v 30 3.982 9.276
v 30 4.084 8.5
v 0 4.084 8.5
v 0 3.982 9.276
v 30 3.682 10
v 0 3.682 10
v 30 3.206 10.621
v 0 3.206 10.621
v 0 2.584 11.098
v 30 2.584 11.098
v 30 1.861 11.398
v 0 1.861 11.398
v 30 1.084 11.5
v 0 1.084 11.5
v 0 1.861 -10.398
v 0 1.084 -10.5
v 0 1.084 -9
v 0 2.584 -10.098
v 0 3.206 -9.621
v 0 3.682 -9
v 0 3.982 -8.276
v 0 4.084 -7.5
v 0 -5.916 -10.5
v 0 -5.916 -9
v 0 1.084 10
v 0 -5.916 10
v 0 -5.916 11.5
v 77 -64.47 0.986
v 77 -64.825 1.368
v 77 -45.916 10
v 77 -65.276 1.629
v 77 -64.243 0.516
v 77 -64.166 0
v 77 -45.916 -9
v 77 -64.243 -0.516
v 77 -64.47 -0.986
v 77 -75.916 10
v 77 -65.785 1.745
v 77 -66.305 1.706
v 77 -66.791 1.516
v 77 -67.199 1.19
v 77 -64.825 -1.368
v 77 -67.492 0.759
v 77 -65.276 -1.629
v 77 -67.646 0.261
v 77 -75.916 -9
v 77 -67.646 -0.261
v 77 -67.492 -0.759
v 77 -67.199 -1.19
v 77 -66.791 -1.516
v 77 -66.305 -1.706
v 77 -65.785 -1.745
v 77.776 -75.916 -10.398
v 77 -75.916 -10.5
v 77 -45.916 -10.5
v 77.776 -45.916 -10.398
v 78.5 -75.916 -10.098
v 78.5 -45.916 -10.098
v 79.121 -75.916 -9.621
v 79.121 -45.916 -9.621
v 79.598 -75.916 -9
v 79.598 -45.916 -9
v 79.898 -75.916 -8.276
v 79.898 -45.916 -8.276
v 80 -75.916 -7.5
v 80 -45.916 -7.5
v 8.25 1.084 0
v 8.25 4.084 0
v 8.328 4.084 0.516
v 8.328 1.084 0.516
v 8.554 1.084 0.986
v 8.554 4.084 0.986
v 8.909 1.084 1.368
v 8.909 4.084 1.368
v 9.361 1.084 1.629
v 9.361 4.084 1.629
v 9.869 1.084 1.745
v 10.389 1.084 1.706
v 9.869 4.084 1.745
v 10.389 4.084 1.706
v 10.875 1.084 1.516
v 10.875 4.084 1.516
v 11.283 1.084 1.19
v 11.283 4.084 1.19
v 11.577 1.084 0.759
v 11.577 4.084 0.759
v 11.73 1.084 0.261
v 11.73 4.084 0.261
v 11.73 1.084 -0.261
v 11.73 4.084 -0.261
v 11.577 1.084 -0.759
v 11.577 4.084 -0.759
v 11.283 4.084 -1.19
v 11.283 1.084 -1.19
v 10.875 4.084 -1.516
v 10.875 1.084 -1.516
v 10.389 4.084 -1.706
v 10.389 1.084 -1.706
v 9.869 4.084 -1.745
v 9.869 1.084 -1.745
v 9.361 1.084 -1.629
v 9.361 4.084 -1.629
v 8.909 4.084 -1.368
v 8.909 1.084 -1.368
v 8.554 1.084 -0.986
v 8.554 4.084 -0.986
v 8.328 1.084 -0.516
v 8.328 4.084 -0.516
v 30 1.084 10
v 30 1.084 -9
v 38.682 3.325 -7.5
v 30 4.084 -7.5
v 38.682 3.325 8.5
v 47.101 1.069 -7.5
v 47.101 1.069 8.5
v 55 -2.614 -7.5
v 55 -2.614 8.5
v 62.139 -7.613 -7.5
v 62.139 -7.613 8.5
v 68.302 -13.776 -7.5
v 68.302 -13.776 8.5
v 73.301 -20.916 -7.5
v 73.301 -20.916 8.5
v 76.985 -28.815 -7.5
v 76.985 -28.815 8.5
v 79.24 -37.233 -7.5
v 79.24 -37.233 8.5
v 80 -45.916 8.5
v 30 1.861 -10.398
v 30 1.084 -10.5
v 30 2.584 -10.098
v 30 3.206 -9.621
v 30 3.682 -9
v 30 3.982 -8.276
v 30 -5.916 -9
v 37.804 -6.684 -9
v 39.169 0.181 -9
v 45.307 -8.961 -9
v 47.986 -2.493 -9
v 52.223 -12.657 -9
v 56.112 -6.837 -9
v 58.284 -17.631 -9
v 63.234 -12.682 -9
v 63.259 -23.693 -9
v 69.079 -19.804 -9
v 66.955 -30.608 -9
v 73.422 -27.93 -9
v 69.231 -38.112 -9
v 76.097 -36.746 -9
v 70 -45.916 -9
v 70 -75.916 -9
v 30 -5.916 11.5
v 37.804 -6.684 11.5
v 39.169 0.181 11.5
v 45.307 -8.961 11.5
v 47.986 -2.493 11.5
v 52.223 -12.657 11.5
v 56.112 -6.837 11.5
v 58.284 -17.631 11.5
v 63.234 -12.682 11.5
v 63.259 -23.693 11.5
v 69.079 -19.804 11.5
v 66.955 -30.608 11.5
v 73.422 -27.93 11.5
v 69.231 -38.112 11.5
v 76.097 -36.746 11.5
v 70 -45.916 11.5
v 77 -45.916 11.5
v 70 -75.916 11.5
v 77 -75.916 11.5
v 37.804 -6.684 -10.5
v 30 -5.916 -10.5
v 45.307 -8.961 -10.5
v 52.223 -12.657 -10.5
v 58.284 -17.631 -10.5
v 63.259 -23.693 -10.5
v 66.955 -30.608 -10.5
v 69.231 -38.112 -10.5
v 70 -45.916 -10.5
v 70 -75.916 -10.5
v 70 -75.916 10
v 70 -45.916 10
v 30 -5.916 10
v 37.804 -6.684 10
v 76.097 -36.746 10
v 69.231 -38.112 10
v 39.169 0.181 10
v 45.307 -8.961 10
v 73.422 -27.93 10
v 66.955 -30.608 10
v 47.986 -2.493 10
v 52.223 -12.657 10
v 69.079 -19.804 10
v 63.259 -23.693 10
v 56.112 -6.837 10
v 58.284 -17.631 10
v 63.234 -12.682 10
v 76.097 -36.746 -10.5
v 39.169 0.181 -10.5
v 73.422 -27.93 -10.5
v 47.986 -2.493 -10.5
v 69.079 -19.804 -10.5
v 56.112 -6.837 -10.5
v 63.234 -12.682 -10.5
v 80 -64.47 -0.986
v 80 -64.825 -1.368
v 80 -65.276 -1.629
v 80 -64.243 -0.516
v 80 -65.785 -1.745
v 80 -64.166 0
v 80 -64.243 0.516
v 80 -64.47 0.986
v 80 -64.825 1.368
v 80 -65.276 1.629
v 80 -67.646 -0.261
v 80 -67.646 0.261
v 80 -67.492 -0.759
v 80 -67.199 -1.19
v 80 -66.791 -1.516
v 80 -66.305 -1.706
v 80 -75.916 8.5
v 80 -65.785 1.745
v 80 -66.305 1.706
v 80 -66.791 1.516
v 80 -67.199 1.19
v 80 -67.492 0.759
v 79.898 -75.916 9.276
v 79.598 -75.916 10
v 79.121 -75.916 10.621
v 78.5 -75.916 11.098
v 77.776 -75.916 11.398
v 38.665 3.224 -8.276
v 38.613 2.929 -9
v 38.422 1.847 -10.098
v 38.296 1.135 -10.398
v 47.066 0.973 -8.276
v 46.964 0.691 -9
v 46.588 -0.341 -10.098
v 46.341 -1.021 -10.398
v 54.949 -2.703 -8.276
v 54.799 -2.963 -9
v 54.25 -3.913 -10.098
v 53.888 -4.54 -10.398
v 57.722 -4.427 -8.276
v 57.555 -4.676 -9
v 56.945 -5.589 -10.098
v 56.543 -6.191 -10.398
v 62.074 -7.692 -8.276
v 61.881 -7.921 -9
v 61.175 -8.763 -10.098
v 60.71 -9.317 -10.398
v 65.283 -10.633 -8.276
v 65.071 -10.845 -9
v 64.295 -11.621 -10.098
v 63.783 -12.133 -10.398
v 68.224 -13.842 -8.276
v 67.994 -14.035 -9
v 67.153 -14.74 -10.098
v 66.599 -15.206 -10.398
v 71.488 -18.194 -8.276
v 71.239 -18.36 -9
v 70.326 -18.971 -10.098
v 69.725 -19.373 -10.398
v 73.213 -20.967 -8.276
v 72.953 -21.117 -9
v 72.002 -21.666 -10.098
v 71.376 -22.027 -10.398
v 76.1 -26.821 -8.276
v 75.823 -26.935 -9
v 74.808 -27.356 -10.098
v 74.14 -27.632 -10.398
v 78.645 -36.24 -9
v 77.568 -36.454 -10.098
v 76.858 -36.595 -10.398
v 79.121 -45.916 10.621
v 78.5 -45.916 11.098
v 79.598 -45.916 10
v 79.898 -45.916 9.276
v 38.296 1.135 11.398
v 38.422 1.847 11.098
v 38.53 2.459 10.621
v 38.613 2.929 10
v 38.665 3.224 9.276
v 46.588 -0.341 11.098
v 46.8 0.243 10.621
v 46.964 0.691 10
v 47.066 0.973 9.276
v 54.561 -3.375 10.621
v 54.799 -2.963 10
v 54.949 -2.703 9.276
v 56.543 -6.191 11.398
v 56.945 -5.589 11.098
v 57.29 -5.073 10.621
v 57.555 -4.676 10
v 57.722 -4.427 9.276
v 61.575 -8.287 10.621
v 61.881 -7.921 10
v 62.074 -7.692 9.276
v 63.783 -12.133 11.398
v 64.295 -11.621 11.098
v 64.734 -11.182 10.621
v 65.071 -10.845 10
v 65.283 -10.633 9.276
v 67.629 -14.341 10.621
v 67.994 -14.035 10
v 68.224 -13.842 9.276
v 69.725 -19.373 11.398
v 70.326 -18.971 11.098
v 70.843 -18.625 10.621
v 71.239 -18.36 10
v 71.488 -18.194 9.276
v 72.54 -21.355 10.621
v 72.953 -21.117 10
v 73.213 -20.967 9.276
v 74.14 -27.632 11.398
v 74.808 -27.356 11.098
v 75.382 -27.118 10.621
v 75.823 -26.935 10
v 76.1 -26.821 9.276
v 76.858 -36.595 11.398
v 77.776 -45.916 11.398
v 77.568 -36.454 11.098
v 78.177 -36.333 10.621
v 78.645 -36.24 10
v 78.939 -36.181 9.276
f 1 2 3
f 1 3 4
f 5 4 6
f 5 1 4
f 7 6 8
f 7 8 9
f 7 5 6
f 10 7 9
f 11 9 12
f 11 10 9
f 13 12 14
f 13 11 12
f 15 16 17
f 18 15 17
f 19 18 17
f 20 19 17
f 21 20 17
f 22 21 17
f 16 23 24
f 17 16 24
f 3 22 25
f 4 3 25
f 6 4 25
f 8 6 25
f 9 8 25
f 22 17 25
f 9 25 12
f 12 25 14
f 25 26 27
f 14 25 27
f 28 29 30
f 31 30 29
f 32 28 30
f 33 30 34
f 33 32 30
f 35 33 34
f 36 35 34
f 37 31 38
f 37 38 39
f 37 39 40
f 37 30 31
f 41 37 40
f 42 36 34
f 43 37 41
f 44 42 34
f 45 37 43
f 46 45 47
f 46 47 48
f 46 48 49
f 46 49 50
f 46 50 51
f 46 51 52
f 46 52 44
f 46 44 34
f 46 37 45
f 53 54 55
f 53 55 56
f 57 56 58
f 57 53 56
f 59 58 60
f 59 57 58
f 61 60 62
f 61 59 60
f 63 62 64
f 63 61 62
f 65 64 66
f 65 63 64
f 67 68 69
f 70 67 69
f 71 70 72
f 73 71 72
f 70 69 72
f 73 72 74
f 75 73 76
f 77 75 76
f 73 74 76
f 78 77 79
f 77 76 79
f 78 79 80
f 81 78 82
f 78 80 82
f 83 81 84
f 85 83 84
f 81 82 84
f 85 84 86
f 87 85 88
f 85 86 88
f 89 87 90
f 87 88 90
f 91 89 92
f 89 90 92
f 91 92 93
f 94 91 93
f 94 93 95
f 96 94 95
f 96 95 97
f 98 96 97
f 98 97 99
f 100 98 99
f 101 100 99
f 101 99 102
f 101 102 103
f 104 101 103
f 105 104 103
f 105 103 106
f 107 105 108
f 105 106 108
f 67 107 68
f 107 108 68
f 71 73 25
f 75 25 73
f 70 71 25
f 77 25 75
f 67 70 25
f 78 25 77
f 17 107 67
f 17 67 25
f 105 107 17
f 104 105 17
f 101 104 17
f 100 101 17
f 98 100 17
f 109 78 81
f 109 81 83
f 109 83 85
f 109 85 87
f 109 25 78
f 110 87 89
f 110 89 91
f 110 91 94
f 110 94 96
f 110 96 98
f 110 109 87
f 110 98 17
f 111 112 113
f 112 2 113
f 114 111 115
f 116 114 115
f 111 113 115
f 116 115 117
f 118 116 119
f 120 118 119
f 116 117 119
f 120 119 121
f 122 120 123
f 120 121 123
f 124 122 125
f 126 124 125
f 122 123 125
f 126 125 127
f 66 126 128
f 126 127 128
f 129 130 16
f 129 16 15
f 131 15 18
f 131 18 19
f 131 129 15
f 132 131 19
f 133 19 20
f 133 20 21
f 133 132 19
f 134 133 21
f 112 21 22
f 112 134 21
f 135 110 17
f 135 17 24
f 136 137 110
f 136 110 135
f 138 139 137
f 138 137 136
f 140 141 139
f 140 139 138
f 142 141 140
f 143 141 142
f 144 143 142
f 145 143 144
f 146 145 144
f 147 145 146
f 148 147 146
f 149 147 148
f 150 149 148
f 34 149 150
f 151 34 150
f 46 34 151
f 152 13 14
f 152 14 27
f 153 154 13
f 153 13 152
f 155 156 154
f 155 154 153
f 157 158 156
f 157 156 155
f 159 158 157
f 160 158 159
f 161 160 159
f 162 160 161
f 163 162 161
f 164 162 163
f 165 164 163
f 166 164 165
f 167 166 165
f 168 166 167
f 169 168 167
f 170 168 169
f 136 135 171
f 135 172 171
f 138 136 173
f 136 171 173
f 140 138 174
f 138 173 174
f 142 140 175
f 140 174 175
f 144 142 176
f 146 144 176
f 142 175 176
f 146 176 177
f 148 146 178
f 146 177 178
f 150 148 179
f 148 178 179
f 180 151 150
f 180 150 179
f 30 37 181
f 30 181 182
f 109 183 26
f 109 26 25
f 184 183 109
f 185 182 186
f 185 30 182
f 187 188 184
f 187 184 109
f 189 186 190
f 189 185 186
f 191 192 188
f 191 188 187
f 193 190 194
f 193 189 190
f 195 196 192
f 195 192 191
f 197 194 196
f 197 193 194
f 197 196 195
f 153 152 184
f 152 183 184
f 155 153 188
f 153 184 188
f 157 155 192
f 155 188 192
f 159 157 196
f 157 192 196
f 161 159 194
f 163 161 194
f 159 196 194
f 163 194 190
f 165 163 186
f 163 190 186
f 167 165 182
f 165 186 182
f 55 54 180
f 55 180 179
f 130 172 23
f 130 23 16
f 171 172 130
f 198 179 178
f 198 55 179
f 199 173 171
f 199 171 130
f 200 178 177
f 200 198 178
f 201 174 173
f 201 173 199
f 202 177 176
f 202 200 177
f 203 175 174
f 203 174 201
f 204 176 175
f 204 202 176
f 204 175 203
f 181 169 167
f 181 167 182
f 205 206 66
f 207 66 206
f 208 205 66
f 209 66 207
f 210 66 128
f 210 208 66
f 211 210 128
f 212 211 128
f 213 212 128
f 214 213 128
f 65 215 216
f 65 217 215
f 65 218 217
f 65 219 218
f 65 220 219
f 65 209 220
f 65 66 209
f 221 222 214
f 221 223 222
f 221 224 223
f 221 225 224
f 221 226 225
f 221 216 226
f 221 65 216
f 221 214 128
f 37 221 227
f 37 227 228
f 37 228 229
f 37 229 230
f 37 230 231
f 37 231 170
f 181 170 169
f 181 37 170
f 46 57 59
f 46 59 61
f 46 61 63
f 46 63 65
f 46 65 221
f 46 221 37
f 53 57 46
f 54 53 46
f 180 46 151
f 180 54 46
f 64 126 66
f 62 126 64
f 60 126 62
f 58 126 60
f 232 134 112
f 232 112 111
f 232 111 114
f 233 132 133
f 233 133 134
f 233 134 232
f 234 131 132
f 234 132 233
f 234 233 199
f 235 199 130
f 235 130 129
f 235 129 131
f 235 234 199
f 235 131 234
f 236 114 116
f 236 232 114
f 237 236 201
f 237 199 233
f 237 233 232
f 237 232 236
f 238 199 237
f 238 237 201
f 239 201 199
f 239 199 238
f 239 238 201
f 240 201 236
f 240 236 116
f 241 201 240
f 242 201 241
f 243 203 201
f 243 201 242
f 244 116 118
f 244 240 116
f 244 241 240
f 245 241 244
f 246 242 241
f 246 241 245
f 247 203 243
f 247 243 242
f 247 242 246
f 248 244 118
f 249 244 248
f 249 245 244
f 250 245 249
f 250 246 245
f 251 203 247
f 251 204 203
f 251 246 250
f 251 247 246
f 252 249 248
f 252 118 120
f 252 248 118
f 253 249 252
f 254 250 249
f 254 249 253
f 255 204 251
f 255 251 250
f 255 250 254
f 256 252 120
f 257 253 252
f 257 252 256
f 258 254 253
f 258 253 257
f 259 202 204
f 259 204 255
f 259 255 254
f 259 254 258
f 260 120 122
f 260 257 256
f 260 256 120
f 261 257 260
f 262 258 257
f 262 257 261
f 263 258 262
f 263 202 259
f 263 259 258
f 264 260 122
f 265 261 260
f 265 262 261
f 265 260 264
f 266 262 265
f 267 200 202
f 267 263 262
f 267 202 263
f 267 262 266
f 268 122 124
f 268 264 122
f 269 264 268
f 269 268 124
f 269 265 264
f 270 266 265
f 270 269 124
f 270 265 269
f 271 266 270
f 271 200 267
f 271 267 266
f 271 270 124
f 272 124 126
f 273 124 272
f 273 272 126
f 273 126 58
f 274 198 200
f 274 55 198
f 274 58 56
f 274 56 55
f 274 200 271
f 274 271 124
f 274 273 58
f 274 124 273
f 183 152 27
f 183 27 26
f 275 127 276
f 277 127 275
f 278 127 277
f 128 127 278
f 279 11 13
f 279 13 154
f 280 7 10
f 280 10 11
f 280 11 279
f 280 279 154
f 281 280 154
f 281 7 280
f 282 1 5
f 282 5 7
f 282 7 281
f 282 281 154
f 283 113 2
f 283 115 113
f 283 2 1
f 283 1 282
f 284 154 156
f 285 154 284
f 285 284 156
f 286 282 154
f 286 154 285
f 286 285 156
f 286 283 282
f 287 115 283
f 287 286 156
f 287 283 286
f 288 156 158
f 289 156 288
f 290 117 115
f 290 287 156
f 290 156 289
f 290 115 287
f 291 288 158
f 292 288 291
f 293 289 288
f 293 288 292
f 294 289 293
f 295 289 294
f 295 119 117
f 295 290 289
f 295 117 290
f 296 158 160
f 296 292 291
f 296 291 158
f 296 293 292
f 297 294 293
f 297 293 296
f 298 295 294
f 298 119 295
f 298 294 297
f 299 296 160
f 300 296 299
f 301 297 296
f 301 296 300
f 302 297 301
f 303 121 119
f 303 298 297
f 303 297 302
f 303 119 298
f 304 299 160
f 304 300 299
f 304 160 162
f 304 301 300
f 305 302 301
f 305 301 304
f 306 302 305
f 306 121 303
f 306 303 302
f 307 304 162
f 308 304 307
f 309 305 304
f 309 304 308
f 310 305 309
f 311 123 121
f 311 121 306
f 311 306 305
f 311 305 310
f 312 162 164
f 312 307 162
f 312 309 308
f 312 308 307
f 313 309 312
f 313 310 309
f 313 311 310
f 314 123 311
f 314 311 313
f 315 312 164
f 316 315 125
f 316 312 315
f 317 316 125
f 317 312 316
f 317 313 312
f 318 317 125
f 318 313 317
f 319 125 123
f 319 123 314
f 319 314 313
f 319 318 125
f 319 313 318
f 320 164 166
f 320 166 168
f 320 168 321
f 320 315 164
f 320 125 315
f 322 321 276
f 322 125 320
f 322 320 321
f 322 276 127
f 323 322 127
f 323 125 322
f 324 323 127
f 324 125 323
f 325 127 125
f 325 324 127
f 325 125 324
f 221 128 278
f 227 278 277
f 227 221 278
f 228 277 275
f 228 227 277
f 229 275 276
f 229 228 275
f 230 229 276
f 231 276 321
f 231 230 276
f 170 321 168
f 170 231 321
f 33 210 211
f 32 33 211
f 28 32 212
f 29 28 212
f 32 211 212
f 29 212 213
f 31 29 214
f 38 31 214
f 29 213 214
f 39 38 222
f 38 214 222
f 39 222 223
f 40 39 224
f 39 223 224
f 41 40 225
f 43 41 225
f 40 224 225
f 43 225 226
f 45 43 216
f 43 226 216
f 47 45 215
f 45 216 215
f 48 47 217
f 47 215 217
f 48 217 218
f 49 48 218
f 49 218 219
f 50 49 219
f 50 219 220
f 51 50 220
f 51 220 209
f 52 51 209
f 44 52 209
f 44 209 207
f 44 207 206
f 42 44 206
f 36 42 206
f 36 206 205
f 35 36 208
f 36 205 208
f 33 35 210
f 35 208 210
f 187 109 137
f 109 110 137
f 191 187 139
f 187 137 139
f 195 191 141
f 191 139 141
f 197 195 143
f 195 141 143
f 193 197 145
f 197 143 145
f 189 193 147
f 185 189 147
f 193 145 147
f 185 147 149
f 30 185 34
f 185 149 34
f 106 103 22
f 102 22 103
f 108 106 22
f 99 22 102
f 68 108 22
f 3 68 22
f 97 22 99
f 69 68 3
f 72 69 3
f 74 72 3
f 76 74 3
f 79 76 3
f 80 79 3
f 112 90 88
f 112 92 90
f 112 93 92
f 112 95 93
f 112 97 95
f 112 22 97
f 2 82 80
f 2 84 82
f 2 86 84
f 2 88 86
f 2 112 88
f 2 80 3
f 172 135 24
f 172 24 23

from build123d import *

# Parameters (mm, degrees)
F3_R     = 1.75
F4_DEPTH = 3
F5_R     = 1.75
F6_DEPTH = 3


with BuildPart() as f2:
    # F2: sweep along a path in F1
    with BuildLine(Plane.XY) as f2_path:
        Line((0, -5.9156941882), (30, -5.9156941882))
        ThreePointArc((30, -5.9156941882), (58.2842712475, -17.6314229407), (70, -45.9156941882))
        Line((70, -45.9156941882), (70, -75.9156941882))
    # F0 (on Right) → F2 (sweep)
    with BuildSketch(Plane.YZ):
        with BuildLine():
            Line((-5.9156941882, 10), (1.0843058118, 10))
            Line((1.0843058118, 10), (1.0843058118, -9))
            Line((1.0843058118, -9), (-5.9156941882, -9))
            Line((-5.9156941882, -9), (-5.9156941882, -10.5))
            Line((-5.9156941882, -10.5), (1.0843058118, -10.5))
            ThreePointArc((1.0843058118, -10.5), (3.2056261554, -9.6213203436), (4.0843058118, -7.5))
            Line((4.0843058118, -7.5), (4.0843058118, 8.5))
            ThreePointArc((4.0843058118, 8.5), (3.2056261554, 10.6213203436), (1.0843058118, 11.5))
            Line((1.0843058118, 11.5), (-5.9156941882, 11.5))
            Line((-5.9156941882, 11.5), (-5.9156941882, 10))
        make_face()
    sweep(path=f2_path.line)

    # F3 (on face) → F4 (cut, through all)
    with BuildSketch(Plane.YZ.offset(80)):
        with Locations((-65.9156941882, 0)):
            Circle(F3_R)
    extrude(amount=-F4_DEPTH, mode=Mode.SUBTRACT)

    # F5 (on face) → F6 (cut, through all)
    with BuildSketch(Plane(origin=(0, 4.0843058118, 0), x_dir=(-1, 0, 0), z_dir=(0, 1, 0))):
        with Locations((-10, 0)):
            Circle(F5_R)
    extrude(amount=-F6_DEPTH, mode=Mode.SUBTRACT)


solid = f2.part
